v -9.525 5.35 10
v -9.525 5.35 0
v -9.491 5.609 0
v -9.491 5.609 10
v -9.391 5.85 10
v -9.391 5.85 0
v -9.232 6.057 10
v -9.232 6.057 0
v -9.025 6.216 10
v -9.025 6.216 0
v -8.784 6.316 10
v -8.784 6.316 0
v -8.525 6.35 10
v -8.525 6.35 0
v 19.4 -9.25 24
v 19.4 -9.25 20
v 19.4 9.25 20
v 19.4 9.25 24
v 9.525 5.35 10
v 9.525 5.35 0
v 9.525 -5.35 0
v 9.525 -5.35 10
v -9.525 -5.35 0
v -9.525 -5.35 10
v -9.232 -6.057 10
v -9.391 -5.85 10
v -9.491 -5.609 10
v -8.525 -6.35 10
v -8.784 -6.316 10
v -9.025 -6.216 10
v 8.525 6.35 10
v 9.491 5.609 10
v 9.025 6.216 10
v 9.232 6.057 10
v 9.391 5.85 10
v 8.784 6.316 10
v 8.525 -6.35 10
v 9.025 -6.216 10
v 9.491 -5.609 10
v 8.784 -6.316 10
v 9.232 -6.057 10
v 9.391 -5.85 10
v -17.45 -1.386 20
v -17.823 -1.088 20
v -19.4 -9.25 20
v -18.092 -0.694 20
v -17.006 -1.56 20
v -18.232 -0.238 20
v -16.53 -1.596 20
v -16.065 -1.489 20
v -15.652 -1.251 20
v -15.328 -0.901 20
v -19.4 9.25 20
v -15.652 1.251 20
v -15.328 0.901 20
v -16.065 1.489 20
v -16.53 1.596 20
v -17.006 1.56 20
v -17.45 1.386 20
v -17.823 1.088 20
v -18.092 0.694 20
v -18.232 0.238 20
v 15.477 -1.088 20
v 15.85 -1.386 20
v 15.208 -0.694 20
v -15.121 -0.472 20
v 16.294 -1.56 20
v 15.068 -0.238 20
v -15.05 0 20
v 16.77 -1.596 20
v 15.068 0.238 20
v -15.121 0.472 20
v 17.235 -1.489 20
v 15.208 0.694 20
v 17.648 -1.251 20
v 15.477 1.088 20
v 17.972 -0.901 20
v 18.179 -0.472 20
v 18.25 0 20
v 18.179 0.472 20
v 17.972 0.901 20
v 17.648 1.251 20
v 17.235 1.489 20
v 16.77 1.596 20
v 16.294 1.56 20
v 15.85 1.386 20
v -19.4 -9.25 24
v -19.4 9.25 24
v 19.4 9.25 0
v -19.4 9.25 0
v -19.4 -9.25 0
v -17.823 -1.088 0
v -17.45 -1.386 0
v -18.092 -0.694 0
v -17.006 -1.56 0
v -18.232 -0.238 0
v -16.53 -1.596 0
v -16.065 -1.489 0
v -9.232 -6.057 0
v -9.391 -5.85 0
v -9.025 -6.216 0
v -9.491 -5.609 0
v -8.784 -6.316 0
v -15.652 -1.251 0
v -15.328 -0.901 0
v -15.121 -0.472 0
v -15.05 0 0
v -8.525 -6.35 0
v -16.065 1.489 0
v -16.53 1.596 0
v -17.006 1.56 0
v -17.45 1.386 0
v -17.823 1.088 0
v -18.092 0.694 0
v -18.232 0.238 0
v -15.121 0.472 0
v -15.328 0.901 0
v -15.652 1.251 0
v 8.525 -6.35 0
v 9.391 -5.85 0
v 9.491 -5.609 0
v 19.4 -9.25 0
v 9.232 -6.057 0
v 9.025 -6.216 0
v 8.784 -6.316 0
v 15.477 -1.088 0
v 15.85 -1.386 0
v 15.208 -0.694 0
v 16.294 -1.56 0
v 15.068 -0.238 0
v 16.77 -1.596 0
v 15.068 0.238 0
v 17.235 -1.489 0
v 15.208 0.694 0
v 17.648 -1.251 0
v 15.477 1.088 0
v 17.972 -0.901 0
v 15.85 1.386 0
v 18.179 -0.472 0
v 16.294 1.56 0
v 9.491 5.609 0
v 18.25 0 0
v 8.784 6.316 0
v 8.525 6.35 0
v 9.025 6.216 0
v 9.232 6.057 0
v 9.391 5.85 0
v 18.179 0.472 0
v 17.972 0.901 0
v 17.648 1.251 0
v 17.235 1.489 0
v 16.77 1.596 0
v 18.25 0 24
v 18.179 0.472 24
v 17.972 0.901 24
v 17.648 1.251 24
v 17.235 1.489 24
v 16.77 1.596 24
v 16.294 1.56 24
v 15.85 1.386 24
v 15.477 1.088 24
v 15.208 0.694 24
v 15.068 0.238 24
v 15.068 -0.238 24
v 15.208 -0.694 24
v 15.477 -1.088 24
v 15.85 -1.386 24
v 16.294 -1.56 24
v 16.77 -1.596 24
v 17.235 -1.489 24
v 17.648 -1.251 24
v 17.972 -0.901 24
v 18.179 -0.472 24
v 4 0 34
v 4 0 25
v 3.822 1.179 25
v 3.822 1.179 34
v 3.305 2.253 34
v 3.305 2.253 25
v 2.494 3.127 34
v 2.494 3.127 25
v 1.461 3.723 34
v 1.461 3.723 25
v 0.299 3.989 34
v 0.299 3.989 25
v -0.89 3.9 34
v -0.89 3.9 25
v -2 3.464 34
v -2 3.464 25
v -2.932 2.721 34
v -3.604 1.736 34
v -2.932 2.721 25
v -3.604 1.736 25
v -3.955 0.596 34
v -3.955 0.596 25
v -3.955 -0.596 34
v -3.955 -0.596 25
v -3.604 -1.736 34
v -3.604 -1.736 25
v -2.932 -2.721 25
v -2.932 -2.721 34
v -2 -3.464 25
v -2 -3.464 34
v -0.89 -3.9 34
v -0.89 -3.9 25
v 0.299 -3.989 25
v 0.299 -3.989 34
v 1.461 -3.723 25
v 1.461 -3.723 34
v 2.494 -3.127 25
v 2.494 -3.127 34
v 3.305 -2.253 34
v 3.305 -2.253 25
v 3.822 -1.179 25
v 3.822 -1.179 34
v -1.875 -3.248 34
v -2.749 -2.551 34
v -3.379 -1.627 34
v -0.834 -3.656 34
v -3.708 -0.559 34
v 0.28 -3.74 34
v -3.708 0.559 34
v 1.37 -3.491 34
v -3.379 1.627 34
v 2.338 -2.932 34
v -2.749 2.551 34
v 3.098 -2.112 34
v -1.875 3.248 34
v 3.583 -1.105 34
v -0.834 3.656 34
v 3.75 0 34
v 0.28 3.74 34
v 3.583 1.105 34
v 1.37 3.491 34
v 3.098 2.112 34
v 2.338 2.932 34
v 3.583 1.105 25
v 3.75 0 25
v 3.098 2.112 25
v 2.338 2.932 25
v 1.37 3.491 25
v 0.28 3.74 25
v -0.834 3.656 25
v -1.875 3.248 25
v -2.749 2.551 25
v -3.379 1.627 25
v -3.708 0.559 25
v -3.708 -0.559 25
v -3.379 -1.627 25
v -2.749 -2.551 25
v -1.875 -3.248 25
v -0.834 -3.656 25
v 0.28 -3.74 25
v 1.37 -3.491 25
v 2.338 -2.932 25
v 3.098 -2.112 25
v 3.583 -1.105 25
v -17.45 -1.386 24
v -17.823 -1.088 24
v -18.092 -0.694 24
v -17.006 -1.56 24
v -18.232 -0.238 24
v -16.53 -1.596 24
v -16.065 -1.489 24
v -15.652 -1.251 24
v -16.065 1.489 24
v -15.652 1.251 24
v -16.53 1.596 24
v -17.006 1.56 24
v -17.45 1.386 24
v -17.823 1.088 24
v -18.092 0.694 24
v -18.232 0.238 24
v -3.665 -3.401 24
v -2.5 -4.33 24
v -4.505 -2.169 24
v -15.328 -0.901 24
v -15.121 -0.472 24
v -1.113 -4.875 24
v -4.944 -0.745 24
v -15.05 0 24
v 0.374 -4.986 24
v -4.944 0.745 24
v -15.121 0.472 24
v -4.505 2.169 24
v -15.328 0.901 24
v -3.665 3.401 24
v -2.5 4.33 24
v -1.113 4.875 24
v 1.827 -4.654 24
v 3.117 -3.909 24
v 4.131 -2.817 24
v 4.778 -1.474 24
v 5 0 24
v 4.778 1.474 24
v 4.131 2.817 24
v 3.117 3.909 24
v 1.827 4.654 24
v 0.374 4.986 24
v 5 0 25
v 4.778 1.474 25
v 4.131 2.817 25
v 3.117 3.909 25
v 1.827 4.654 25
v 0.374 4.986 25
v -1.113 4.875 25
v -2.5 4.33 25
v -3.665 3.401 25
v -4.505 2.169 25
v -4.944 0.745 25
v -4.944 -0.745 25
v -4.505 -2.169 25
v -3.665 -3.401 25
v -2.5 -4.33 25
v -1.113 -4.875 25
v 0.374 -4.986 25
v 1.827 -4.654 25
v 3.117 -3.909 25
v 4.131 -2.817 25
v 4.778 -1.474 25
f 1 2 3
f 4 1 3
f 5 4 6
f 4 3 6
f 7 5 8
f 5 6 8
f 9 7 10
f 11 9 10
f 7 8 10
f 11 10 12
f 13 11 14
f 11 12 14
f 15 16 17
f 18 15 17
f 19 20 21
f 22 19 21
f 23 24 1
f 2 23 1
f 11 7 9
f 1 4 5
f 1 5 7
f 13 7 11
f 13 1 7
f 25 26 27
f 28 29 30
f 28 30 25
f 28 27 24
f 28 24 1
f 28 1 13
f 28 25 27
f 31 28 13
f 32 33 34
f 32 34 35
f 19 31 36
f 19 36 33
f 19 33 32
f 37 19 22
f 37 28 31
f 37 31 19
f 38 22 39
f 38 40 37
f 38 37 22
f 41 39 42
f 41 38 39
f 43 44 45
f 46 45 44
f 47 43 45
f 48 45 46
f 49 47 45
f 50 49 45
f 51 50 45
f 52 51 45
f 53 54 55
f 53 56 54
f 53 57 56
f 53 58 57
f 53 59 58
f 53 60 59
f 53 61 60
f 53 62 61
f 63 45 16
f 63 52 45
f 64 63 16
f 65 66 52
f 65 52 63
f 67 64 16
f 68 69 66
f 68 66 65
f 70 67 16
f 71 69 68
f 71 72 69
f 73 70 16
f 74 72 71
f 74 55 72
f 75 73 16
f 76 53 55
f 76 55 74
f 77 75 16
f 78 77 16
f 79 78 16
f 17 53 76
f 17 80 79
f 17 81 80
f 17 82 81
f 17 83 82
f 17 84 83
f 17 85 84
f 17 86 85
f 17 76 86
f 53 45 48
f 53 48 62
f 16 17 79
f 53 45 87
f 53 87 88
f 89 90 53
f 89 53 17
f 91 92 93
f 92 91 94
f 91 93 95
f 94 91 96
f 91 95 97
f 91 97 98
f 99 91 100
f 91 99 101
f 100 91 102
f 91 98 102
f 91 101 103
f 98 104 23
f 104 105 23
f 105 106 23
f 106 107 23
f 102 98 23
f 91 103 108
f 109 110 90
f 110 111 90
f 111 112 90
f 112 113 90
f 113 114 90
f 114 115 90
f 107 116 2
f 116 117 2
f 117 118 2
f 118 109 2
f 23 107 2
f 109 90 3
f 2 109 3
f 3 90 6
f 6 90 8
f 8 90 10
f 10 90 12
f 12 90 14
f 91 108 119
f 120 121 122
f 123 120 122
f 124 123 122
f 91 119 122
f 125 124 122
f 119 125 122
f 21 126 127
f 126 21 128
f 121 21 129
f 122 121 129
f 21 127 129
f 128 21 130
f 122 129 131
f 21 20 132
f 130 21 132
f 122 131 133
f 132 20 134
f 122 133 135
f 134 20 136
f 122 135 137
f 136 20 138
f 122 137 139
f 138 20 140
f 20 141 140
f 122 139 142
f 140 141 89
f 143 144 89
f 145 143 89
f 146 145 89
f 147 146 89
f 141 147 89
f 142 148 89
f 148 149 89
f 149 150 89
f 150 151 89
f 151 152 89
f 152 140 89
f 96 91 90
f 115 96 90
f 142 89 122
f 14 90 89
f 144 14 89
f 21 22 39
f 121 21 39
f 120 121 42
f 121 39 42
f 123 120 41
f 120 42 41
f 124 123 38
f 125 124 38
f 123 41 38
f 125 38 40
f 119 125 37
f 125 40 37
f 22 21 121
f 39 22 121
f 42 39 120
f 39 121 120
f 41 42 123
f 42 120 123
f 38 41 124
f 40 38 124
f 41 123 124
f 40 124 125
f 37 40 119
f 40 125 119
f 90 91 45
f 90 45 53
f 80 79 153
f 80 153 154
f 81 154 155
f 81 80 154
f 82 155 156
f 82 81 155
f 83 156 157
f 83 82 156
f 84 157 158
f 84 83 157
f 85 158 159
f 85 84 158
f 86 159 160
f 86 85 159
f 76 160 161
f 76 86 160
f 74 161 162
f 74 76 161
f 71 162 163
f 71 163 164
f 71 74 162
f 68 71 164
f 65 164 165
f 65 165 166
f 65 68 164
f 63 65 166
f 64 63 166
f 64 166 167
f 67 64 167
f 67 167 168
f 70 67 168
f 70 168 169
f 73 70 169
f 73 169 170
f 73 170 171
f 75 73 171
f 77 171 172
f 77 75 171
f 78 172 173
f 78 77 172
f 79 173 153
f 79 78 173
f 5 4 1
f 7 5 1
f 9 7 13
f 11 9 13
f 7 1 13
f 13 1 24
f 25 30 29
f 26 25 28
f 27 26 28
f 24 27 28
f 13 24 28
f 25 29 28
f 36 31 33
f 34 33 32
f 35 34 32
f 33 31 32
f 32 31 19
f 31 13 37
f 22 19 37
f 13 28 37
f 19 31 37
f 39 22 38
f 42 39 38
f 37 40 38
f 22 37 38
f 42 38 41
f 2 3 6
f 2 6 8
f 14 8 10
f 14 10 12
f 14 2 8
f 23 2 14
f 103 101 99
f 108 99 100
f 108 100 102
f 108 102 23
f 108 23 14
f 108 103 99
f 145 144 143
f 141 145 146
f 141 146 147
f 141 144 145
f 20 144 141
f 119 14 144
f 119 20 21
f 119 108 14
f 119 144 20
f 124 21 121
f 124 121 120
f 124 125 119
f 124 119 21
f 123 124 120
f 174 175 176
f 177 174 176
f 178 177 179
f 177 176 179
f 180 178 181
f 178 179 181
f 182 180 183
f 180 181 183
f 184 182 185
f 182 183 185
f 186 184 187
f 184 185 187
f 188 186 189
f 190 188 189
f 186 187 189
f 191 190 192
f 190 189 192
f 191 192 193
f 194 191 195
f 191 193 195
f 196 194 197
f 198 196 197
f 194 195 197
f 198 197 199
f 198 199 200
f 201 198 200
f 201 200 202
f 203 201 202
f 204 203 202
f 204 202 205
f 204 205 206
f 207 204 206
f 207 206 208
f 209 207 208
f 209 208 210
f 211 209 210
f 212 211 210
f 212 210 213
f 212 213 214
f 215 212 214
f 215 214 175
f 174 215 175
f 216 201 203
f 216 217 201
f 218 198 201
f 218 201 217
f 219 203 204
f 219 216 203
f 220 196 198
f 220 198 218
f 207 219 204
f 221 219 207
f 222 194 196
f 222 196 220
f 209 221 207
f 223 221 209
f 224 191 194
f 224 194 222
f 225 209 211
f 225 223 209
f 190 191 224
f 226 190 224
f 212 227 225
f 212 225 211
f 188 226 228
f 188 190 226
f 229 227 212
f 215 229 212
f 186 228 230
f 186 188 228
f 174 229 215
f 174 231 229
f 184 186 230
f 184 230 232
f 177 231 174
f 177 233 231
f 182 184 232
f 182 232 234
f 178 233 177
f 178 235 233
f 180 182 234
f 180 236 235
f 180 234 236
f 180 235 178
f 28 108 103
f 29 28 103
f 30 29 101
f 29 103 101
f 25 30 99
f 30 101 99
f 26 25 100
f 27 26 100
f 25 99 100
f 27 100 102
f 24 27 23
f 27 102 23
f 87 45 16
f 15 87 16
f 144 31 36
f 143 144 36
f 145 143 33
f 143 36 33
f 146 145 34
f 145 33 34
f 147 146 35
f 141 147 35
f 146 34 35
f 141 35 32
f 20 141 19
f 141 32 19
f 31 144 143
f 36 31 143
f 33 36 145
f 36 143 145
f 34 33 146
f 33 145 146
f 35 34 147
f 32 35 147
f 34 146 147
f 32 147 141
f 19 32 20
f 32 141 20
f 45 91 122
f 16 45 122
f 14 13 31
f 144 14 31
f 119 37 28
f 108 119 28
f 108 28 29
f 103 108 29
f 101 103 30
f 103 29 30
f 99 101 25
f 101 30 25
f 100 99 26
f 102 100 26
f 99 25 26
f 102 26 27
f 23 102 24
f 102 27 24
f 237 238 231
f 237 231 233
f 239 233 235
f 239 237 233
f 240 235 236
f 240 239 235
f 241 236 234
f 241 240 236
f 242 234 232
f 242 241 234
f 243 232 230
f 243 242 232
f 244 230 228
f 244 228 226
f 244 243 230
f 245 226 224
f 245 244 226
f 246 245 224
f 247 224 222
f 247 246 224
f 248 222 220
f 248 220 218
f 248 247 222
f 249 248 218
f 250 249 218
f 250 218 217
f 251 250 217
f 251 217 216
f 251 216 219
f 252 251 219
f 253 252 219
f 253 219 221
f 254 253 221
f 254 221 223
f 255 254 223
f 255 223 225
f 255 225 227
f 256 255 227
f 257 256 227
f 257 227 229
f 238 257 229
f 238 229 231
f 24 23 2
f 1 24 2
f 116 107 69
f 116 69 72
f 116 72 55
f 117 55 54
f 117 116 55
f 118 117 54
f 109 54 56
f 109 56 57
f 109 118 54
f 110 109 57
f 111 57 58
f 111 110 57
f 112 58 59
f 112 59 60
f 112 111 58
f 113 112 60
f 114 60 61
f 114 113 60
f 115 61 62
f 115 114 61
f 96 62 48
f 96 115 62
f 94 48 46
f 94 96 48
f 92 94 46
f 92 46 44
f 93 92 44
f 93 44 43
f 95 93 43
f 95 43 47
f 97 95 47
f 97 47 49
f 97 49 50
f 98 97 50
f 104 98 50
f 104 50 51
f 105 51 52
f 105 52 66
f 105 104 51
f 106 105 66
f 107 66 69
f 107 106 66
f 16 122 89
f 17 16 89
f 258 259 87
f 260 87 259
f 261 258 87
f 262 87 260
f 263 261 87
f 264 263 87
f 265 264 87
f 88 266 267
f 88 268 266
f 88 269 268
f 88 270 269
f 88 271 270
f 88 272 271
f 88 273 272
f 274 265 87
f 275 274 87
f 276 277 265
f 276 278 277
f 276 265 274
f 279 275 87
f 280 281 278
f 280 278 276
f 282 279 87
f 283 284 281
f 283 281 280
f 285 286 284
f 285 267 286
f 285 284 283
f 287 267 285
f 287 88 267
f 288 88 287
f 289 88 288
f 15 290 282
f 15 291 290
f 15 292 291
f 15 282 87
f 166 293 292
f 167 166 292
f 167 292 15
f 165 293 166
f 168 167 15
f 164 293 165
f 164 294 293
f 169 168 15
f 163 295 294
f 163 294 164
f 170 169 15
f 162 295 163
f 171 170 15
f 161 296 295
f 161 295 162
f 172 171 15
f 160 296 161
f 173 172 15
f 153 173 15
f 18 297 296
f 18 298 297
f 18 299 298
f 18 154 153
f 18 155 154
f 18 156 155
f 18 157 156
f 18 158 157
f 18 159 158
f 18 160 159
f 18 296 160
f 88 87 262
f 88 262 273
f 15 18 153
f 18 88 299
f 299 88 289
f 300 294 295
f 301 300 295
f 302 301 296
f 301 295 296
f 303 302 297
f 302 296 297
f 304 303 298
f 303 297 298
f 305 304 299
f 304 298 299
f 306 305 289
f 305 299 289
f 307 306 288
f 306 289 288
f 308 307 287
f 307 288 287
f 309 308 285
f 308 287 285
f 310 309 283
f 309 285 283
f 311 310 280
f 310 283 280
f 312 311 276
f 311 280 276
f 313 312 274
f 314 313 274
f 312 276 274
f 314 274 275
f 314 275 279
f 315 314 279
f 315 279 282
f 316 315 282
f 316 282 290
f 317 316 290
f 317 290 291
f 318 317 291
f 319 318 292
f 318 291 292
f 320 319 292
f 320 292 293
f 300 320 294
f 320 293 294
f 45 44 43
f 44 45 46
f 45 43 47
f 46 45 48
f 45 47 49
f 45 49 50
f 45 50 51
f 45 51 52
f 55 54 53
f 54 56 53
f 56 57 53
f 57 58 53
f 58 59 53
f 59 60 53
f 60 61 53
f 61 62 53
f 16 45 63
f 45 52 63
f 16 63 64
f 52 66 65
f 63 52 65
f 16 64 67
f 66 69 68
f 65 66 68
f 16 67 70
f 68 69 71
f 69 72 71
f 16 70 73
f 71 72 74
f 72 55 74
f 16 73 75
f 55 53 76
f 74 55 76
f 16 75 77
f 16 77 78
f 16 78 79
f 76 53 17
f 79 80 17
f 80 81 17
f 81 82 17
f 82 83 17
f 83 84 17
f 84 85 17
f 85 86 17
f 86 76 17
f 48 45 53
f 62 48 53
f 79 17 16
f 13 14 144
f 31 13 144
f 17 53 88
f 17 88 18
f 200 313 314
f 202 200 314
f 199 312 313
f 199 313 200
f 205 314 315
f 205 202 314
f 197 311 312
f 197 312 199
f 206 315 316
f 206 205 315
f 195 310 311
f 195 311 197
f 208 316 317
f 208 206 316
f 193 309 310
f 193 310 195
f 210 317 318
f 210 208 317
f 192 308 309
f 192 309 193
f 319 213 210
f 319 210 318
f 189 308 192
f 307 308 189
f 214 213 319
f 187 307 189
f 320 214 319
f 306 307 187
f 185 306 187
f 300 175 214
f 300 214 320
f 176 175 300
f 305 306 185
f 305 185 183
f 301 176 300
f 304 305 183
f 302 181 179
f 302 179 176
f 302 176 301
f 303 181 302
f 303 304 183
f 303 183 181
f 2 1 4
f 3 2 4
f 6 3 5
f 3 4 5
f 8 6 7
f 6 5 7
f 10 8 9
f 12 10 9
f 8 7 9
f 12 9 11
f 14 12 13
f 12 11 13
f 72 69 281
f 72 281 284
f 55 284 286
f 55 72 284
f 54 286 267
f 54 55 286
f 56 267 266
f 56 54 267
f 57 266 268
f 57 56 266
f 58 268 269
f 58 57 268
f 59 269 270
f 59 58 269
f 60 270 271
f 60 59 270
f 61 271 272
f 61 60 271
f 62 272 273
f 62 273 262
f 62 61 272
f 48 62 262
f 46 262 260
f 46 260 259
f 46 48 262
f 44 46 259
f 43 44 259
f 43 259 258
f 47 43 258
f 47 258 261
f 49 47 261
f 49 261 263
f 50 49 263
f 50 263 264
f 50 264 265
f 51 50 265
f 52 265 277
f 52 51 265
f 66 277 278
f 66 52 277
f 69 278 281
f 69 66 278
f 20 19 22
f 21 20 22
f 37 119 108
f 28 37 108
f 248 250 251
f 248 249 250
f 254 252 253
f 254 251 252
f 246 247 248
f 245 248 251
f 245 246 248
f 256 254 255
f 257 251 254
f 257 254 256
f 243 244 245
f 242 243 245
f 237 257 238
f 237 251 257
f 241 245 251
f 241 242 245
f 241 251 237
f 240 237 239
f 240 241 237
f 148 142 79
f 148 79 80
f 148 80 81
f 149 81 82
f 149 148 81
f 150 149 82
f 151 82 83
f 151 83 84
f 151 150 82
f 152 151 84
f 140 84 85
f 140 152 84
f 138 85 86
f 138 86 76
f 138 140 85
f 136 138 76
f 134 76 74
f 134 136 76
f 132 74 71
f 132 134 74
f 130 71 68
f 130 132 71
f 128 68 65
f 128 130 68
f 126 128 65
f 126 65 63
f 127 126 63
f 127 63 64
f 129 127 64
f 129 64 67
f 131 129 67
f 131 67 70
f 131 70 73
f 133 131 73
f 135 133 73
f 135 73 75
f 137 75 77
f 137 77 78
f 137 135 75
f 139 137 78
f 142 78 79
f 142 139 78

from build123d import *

# Parameters (mm, degrees)
F0_W      = 38.8
F0_H      = 18.5
F0_R      = 1.6
F1_DEPTH  = 20
F1_FACE_W = 38.8
F1_FACE_H = 18.5
F1_FACE_R = 1.6
F2_DEPTH  = 4
F4_DEPTH  = 10
F5_DEPTH  = 10
F6_R      = 4
F6_R_2    = 3.75
F7_DEPTH  = 10
F8_R      = 5
F9_DEPTH  = 1


with BuildPart() as f1:
    # F0 (on Top) → F1 (new body)
    with BuildSketch(Plane.XY):
        Rectangle(F0_W, F0_H)
        with Locations((-16.65, 0)):
            Circle(F0_R, mode=Mode.SUBTRACT)
        with Locations((16.65, 0)):
            Circle(F0_R, mode=Mode.SUBTRACT)
    extrude(amount=F1_DEPTH)

    # F3 (on face) → F4 (cut)
    with BuildSketch(Plane(origin=(0, 0, 0), x_dir=(1, 0, 0), z_dir=(0, 0, -1))):
        with BuildLine():
            Line((-8.525, -6.35), (8.525, -6.35))
            ThreePointArc((8.525, -6.35), (9.232107, -6.057107), (9.525, -5.35))
            Line((9.525, -5.35), (9.525, 5.35))
            ThreePointArc((9.525, 5.35), (9.232107, 6.057107), (8.525, 6.35))
            Line((8.525, 6.35), (-8.525, 6.35))
            ThreePointArc((-8.525, 6.35), (-9.232107, 6.057107), (-9.525, 5.35))
            Line((-9.525, 5.35), (-9.525, -5.35))
            ThreePointArc((-9.525, -5.35), (-9.232107, -6.057107), (-8.525, -6.35))
        make_face()
    extrude(amount=-F4_DEPTH, mode=Mode.SUBTRACT)


with BuildPart() as f2:
    # F1_face (on face) → F2 (new body)
    with BuildSketch(Plane.XY.offset(20)):
        Rectangle(F1_FACE_W, F1_FACE_H)
        with Locations((-16.65, 0)):
            Circle(F1_FACE_R, mode=Mode.SUBTRACT)
        with Locations((16.65, 0)):
            Circle(F1_FACE_R, mode=Mode.SUBTRACT)
    extrude(amount=F2_DEPTH)

    # F6 (on face) → F7 (join)
    with BuildSketch(Plane.XY.offset(24)):
        Circle(F6_R)
        Circle(F6_R_2, mode=Mode.SUBTRACT)
    extrude(amount=F7_DEPTH)

    # F8 (on face) → F9 (join)
    with BuildSketch(Plane.XY.offset(24)):
        Circle(F8_R)
    extrude(amount=F9_DEPTH)


with BuildPart() as f5:
    # F4_face (on face) → F5 (new body)
    with BuildSketch(Plane(origin=(0, 0, 10), x_dir=(1, 0, 0), z_dir=(0, 0, -1))):
        with BuildLine():
            Line((-9.525, 5.35), (-9.525, -5.35))
            ThreePointArc((-9.525, -5.35), (-9.232107, -6.057107), (-8.525, -6.35))
            Line((-8.525, -6.35), (8.525, -6.35))
            ThreePointArc((8.525, -6.35), (9.232107, -6.057107), (9.525, -5.35))
            Line((9.525, -5.35), (9.525, 5.35))
            ThreePointArc((9.525, 5.35), (9.232107, 6.057107), (8.525, 6.35))
            Line((8.525, 6.35), (-8.525, 6.35))
            ThreePointArc((-8.525, 6.35), (-9.232107, 6.057107), (-9.525, 5.35))
        make_face()
    extrude(amount=F5_DEPTH)


solid = Compound([f1.part, f2.part, f5.part])
